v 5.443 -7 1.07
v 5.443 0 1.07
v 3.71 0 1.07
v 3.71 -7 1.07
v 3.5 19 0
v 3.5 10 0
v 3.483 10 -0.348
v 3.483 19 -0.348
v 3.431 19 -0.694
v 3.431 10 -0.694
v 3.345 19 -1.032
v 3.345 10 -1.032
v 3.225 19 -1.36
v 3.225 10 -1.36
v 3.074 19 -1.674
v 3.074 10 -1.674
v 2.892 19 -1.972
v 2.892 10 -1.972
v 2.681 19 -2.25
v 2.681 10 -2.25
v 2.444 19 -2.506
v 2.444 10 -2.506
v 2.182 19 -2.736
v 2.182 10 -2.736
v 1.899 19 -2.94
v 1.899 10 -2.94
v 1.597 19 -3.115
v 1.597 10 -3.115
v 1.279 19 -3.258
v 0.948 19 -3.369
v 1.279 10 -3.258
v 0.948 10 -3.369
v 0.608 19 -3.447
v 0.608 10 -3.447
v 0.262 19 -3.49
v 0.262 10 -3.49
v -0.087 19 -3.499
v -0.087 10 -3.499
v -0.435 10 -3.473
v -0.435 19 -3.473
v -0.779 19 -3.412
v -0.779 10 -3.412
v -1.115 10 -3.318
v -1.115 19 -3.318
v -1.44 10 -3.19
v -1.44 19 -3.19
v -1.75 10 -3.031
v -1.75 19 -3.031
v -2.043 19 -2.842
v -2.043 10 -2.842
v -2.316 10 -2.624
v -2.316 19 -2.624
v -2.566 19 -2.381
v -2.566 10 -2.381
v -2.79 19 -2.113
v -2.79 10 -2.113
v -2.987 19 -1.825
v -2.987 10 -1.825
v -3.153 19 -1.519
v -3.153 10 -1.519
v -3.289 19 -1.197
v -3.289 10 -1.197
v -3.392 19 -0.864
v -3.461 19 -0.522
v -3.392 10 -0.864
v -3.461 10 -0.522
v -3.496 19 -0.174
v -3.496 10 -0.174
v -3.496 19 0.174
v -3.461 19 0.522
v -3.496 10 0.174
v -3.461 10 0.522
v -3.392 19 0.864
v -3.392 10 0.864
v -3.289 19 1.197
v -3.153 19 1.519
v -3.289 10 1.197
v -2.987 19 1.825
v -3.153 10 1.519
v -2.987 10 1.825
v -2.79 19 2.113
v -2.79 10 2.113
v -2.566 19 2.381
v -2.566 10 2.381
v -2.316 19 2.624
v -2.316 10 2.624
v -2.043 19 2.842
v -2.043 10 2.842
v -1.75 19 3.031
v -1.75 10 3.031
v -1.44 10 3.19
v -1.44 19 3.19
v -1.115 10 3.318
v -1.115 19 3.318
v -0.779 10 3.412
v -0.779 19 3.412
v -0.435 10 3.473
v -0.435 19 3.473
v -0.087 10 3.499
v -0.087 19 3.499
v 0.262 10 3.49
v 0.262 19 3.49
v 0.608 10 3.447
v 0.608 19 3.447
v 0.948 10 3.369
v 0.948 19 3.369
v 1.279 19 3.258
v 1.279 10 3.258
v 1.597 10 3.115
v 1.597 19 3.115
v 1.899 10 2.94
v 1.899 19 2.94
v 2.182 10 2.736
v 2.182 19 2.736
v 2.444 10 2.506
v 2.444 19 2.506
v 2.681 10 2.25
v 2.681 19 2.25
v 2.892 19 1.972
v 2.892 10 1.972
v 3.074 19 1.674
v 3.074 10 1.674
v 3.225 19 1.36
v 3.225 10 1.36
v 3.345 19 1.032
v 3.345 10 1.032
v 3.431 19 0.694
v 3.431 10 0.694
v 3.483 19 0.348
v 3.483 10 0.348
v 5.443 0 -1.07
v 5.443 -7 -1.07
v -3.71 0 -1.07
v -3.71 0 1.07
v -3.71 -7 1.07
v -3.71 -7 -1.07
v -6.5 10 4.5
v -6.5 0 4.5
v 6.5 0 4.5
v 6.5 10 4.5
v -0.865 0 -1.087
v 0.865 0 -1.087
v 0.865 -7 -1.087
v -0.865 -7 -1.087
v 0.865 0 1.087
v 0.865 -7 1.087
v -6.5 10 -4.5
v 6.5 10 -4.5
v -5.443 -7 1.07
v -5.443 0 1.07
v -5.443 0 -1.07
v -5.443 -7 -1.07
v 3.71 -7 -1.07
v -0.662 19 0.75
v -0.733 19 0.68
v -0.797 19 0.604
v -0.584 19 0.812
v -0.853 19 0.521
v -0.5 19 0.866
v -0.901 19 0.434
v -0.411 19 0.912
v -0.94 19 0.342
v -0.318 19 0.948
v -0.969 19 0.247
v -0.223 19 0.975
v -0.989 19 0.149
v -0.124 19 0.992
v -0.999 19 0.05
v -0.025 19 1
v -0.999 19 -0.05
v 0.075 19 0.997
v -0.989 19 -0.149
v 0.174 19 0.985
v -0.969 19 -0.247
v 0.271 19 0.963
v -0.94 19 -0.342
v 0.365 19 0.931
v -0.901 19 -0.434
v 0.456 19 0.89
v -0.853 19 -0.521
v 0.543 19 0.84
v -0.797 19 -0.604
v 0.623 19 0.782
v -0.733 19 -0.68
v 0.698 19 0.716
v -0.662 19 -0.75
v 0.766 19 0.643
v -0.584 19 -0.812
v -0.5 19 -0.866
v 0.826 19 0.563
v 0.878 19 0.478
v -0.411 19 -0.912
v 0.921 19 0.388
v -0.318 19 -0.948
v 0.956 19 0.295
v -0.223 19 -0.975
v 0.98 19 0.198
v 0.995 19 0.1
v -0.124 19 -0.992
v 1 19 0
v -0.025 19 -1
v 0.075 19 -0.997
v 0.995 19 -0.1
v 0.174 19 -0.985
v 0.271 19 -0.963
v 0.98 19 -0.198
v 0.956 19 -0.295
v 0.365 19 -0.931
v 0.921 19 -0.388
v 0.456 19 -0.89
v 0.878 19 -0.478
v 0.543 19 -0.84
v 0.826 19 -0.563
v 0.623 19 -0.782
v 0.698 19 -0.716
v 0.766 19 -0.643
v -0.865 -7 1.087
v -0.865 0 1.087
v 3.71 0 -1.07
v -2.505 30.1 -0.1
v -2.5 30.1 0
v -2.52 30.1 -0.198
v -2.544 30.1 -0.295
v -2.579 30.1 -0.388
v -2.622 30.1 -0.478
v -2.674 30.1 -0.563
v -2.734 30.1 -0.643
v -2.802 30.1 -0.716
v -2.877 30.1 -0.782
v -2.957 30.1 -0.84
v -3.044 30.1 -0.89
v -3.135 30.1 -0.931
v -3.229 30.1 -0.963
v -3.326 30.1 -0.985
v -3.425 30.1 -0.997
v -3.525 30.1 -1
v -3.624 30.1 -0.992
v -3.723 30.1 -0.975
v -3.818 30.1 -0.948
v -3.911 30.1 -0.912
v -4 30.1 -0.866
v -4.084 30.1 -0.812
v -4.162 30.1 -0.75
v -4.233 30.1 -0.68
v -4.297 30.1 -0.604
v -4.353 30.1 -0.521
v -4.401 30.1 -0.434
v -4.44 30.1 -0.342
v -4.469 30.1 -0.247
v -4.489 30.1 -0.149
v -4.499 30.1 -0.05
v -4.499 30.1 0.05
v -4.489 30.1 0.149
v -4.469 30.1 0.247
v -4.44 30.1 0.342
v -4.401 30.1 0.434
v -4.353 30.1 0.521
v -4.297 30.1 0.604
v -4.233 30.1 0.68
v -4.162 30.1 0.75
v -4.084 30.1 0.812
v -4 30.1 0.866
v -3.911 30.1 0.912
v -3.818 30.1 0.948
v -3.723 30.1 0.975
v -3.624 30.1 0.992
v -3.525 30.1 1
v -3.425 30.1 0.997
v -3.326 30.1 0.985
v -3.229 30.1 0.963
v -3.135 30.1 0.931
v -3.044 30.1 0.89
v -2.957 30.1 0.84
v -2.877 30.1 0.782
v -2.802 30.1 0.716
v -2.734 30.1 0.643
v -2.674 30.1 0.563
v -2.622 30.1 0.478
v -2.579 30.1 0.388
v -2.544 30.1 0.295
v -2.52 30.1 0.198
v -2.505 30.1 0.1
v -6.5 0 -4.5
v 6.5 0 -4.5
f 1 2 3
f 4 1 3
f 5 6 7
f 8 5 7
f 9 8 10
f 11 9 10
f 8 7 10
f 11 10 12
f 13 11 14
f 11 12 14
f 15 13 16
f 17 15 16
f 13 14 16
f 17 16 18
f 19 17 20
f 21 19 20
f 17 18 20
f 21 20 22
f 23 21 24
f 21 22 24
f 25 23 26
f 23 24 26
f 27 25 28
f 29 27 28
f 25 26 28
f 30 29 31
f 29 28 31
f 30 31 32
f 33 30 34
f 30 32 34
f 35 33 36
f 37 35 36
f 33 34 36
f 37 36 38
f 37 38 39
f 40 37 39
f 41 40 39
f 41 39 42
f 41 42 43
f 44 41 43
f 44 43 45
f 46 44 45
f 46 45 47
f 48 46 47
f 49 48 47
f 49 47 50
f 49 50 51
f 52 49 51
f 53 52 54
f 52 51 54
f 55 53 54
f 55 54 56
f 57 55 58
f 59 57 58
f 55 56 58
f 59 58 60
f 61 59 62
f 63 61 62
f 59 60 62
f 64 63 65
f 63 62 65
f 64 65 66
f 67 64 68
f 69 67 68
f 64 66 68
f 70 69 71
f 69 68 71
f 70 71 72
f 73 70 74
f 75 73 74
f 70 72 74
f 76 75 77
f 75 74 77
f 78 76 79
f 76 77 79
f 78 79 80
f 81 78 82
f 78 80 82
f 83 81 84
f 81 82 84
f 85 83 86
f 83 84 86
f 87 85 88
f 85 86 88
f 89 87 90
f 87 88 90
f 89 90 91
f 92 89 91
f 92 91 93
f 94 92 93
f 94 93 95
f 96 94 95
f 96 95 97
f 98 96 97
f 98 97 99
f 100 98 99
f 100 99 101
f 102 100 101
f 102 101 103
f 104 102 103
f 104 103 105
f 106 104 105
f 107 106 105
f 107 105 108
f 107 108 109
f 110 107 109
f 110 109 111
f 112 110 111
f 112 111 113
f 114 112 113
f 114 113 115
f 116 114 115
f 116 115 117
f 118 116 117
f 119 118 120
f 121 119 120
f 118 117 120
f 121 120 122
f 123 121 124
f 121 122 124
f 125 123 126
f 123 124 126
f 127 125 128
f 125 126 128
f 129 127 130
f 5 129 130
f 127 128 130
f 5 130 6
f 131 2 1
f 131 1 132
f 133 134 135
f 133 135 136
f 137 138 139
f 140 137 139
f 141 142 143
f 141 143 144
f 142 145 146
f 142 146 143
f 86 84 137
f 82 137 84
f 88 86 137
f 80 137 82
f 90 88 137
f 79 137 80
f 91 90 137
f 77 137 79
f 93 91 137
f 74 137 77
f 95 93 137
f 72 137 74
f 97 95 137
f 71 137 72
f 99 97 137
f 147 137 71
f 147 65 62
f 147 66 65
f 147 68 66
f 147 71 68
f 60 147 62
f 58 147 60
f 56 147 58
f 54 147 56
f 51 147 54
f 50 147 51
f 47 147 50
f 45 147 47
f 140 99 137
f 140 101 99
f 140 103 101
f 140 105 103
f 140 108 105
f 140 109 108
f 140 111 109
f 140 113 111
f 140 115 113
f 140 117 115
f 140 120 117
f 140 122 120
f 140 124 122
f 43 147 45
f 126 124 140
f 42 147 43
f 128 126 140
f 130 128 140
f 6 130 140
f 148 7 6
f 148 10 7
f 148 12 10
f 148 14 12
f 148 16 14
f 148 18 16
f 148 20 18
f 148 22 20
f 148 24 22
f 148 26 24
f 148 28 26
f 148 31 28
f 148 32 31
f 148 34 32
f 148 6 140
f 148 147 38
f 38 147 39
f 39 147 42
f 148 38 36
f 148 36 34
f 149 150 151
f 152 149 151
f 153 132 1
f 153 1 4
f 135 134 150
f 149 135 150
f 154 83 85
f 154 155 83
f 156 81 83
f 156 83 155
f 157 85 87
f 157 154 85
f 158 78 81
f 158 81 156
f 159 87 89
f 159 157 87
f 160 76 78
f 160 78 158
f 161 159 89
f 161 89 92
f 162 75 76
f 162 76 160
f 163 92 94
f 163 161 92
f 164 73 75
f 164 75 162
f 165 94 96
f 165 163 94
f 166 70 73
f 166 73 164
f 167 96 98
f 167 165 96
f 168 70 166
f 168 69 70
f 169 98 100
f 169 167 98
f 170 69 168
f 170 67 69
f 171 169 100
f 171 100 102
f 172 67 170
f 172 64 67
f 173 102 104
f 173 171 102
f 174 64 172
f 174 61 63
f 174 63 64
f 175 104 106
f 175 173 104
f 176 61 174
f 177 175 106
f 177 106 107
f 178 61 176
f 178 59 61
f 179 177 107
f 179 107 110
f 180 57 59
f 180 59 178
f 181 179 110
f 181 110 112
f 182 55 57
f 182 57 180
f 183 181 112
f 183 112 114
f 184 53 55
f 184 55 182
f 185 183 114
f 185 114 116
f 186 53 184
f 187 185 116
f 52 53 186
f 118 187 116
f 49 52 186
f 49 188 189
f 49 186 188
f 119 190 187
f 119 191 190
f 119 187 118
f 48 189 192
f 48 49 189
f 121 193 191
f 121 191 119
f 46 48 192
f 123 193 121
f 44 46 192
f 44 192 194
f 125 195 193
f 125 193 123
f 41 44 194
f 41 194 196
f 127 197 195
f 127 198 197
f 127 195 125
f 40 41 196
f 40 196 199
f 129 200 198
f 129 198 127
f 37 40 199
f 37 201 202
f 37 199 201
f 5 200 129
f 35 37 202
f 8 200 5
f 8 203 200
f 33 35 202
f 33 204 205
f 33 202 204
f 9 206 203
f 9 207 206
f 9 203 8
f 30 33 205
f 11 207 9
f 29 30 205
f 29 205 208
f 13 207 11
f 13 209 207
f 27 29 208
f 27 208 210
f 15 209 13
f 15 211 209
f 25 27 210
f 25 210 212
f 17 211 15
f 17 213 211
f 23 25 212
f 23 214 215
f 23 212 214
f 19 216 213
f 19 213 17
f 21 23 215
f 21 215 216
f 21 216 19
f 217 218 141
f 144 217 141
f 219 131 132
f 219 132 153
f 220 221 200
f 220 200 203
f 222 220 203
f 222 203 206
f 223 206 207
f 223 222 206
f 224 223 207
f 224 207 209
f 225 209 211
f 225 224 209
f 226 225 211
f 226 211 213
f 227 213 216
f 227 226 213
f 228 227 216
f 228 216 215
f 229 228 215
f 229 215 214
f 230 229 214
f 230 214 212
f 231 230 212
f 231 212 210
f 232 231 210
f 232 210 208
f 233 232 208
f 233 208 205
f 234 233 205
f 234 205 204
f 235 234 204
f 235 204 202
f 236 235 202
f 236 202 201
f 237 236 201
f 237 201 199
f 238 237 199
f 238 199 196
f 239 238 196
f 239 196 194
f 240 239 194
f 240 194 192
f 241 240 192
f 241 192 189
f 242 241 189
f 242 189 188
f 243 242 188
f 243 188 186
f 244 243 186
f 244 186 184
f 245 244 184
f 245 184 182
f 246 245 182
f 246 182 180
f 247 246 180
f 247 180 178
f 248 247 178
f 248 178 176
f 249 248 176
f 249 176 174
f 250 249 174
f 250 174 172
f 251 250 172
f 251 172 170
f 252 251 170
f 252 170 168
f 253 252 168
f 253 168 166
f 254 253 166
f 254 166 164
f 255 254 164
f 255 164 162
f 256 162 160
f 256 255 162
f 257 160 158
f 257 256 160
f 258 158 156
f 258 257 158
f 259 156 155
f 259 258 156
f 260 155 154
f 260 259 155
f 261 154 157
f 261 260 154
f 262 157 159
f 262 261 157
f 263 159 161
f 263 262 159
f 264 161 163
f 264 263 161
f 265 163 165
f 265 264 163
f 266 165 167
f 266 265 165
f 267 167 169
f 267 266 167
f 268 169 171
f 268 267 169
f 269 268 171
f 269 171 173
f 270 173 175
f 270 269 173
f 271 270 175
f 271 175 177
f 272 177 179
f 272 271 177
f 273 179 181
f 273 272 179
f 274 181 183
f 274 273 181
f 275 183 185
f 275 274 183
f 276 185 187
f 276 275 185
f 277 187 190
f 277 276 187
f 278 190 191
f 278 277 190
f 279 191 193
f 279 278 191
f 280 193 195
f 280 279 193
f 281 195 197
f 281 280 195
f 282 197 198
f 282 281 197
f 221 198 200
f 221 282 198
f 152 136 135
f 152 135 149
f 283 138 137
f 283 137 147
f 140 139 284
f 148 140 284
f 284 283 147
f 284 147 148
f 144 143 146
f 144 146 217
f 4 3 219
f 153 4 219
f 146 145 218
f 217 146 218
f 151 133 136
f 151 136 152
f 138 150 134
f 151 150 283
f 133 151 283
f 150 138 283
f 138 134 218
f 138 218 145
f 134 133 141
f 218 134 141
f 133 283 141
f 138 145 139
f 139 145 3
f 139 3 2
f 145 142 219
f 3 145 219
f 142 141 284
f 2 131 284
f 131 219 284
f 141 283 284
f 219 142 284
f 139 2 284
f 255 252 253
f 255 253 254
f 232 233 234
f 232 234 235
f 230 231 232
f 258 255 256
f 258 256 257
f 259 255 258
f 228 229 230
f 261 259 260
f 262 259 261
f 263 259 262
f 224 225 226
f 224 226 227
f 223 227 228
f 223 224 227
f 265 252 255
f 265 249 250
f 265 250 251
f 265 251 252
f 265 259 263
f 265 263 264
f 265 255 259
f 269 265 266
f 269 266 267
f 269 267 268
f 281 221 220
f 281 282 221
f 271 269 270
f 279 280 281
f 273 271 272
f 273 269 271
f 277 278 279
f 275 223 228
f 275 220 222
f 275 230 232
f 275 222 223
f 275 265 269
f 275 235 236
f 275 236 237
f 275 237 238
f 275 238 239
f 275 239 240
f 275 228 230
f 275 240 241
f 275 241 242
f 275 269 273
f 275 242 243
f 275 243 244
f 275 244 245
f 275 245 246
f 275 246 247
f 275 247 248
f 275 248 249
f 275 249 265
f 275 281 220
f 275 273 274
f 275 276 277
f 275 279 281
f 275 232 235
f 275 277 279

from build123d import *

# Parameters (mm, degrees)
SKETCH_1_W      = 13
SKETCH_1_H      = 9
EXTRUDE_1_DEPTH = 10
SKETCH_2_R      = 3.5
EXTRUDE_2_DEPTH = 9
SKETCH_4_R      = 1
SKETCH_5_W      = 1.73309276
SKETCH_5_H      = 2.139523058
SKETCH_5_W_2    = 1.729366682
SKETCH_5_H_2    = 2.174749504
EXTRUDE_3_DEPTH = 7


with BuildPart() as part:
    # 草图1 → 凸台-拉伸1 (new body)
    with BuildSketch(Plane(origin=(0, 0, 0), x_dir=(1, 0, 0), z_dir=(0, 1, 0))):
        Rectangle(SKETCH_1_W, SKETCH_1_H)
    extrude(amount=EXTRUDE_1_DEPTH)

    # 草图2 → 凸台-拉伸2 (add)
    with BuildSketch(Plane(origin=(0, 10, 0), x_dir=(1, 0, 0), z_dir=(0, 1, 0))):
        Circle(SKETCH_2_R)
    extrude(amount=EXTRUDE_2_DEPTH)

    # 扫描1: sweep along a path in 草图3
    with BuildLine(Plane.XY) as sweep_1_path:
        Line((0, 19), (-3.5, 30.100205658))
    # 草图4 → 扫描1 (sweep)
    with BuildSketch(Plane(origin=(0, 19, 0), x_dir=(1, 0, 0), z_dir=(0, 1, 0))):
        Circle(SKETCH_4_R)
    sweep(path=sweep_1_path.line)

    # 草图5 → 凸台-拉伸3 (add)
    with BuildSketch(Plane(origin=(0, 0, 0), x_dir=(-1, 0, 0), z_dir=(0, -1, 0))):
        with Locations((-4.576618424, 0)):
            Rectangle(SKETCH_5_W, SKETCH_5_H)
        with Locations((4.576618424, 0)):
            Rectangle(SKETCH_5_W, SKETCH_5_H)
        Rectangle(SKETCH_5_W_2, SKETCH_5_H_2)
    extrude(amount=EXTRUDE_3_DEPTH)


solid = part.part
